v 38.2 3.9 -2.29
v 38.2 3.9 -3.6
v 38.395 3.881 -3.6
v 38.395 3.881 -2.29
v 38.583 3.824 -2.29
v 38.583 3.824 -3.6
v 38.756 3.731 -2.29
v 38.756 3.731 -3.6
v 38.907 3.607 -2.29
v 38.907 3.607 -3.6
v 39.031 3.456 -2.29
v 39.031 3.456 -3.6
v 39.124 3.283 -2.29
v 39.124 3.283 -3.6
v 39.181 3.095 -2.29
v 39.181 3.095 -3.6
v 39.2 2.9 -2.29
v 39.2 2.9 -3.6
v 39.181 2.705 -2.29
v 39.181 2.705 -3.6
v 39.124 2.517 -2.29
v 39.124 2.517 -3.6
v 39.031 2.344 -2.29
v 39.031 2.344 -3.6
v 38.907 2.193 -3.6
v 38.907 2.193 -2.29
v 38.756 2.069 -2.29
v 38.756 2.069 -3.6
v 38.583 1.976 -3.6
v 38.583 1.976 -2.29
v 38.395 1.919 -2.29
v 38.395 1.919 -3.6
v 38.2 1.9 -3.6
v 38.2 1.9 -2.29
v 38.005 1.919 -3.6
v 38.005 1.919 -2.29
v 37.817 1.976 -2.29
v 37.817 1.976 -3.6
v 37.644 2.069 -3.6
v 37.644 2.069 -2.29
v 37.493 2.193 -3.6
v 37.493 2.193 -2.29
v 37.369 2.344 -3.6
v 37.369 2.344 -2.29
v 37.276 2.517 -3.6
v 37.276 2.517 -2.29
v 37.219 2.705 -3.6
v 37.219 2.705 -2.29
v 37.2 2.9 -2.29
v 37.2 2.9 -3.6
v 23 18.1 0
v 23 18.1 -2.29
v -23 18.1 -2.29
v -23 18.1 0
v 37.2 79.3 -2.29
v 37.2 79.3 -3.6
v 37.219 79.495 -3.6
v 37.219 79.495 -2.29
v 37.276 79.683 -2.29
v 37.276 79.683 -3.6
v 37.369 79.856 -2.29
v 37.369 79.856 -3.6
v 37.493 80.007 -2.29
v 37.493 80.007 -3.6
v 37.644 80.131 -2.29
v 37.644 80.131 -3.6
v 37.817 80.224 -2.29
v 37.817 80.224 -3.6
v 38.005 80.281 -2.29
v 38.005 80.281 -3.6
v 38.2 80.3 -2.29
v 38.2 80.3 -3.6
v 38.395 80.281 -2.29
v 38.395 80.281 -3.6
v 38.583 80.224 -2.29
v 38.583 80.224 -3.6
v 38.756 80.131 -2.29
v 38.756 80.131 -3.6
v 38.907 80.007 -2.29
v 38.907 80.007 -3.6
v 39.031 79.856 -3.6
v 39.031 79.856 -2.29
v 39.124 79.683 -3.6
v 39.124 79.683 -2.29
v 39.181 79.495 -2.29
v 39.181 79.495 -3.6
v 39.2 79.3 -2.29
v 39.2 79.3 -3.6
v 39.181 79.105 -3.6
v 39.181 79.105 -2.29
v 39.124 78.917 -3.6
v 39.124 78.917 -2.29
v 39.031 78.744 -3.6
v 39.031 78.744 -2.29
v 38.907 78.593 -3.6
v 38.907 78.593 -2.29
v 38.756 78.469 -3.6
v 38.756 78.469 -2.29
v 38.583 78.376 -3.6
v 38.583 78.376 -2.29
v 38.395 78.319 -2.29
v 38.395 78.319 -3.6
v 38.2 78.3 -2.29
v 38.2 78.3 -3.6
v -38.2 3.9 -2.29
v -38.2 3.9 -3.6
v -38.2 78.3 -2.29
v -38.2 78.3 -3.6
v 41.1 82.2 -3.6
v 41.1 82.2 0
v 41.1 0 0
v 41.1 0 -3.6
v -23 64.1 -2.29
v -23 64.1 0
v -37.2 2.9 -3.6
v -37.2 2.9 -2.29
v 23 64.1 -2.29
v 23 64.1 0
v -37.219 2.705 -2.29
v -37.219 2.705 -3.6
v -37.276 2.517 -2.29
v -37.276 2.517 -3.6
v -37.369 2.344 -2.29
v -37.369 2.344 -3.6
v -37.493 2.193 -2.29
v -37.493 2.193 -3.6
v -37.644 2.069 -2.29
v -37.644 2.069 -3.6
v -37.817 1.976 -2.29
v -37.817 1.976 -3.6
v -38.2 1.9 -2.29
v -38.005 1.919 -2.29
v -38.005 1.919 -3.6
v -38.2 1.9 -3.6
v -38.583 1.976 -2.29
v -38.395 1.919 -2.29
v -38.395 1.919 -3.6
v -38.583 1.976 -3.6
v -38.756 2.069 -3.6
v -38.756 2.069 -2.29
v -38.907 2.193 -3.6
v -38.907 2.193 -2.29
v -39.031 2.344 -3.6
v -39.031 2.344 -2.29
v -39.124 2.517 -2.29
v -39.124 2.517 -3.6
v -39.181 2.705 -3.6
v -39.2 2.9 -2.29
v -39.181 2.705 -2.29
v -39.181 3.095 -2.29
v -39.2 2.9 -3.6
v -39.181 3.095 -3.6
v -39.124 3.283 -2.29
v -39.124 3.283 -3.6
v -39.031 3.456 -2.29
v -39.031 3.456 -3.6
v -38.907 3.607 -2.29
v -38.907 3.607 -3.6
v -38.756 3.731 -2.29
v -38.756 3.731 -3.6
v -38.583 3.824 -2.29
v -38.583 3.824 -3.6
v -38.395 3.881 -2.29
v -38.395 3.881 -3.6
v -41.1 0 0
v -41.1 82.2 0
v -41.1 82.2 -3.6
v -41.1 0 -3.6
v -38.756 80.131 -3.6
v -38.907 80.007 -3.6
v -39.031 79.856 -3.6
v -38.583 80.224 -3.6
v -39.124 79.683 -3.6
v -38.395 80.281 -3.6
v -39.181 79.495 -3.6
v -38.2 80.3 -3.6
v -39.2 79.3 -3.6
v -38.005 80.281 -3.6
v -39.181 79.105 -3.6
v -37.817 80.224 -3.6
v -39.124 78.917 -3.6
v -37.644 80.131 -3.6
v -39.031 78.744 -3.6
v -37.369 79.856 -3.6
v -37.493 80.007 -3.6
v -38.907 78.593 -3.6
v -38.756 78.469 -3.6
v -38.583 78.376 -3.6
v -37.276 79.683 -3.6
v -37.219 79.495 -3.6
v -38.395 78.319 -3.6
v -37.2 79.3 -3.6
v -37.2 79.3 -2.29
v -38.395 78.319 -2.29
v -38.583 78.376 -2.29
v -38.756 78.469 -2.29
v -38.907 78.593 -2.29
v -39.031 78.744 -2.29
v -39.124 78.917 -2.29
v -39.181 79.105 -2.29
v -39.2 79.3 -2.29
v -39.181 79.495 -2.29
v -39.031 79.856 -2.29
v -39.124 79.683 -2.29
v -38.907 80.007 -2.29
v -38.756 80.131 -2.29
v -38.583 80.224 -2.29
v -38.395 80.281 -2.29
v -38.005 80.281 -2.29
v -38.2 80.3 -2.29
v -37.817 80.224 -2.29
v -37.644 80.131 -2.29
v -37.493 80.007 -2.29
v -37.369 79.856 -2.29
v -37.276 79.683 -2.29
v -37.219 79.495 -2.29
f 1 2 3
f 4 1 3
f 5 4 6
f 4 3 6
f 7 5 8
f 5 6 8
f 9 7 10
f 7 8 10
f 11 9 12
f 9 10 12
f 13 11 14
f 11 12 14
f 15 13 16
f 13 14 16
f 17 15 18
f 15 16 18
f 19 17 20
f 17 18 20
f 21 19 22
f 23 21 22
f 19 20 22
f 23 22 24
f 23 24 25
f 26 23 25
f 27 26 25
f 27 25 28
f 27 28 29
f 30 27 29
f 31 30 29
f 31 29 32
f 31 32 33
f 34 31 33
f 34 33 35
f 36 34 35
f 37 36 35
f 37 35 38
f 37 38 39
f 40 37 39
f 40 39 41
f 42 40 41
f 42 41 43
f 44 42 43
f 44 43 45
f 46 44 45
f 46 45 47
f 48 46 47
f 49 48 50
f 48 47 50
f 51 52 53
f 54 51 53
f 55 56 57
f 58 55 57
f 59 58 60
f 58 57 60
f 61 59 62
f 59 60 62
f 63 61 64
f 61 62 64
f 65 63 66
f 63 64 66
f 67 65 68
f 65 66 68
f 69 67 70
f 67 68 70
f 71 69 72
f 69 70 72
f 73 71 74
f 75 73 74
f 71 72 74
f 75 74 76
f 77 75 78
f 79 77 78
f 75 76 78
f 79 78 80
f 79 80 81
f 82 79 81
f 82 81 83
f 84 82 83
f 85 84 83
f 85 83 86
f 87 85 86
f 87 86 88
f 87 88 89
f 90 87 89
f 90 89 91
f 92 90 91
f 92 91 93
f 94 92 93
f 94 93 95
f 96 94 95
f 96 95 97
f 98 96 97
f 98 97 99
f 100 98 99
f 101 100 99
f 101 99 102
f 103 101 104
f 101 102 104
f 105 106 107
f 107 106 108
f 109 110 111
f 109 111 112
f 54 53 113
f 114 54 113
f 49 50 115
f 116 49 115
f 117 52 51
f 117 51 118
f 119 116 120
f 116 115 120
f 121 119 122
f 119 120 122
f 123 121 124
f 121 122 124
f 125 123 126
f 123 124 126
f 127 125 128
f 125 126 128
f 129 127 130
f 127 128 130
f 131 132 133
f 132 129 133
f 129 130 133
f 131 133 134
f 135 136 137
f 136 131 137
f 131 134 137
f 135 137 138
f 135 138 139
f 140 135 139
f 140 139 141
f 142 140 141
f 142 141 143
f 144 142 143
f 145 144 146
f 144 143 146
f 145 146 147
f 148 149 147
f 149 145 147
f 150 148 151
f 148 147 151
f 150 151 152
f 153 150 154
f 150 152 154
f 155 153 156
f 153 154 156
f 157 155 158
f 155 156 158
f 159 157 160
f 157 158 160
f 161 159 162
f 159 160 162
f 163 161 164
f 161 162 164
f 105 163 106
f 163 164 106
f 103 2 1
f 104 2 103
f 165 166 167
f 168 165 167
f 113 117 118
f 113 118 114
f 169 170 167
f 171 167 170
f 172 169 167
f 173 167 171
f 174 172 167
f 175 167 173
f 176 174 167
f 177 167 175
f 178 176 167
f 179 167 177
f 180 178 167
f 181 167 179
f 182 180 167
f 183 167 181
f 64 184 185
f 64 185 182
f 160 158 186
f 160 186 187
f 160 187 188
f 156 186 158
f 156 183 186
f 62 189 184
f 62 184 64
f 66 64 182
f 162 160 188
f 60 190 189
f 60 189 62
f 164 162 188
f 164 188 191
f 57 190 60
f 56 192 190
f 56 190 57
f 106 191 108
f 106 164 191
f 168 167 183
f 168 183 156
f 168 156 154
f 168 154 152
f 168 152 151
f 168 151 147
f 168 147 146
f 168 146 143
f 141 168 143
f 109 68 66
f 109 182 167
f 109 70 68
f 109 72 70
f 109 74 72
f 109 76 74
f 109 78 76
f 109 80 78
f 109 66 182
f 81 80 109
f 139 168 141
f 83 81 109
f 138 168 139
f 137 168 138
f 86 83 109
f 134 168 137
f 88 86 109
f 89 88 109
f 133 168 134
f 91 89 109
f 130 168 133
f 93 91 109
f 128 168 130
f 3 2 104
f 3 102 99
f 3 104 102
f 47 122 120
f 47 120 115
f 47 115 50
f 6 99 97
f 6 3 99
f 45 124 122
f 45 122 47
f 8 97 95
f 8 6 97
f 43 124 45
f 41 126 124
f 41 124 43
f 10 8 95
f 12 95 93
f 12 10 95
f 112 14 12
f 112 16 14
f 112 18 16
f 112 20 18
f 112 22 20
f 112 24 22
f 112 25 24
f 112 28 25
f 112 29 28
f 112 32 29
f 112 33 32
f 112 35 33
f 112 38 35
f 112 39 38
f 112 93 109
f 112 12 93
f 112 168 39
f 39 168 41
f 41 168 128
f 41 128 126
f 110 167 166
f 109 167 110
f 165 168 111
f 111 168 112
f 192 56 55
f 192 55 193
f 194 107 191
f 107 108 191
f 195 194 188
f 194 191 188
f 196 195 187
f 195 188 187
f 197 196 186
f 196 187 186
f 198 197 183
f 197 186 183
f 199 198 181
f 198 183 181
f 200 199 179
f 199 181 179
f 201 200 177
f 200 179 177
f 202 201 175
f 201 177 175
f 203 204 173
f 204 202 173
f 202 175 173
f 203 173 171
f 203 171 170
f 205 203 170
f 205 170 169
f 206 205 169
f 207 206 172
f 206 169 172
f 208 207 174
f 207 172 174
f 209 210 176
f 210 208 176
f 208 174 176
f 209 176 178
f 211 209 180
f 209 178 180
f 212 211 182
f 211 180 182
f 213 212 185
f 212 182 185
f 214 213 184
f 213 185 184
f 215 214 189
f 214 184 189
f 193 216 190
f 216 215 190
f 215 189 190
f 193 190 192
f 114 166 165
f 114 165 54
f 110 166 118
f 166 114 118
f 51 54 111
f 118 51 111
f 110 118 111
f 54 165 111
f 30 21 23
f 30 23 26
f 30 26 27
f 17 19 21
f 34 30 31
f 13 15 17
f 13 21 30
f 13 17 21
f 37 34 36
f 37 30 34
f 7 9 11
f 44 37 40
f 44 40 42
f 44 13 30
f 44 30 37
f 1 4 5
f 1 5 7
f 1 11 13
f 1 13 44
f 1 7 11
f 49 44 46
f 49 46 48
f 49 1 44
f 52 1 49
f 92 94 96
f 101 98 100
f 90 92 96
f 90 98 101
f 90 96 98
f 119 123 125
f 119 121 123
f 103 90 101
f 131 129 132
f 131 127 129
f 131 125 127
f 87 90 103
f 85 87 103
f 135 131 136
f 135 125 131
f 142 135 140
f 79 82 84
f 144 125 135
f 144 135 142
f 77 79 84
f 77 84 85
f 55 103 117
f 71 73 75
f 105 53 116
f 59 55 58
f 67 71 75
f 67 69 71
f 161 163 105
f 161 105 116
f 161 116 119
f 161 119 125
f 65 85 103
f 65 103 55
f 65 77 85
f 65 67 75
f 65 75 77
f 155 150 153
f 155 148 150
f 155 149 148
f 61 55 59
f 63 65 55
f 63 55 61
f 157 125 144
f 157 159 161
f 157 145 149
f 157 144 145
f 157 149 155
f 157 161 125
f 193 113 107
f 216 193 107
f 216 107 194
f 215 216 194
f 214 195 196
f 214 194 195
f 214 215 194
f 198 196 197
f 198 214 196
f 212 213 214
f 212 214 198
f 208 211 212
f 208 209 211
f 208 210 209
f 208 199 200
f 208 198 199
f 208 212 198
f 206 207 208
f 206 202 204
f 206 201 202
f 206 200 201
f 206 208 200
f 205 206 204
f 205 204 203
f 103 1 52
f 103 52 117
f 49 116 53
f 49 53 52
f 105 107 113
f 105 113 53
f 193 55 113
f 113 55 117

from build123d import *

# Parameters (mm, degrees)
SKETCH1_W           = 82.2
SKETCH1_H           = 3.6
BOSS_EXTRUDE1_DEPTH = 82.2
SKETCH2_W           = 76.4
SKETCH2_H           = 76.4
CUT_EXTRUDE1_DEPTH  = 1.31
SKETCH4_R           = 1
CUT_EXTRUDE3_DEPTH  = 1.31
SKETCH3_W           = 46
SKETCH3_H           = 46
CUT_EXTRUDE2_DEPTH  = 92.930920261


with BuildPart() as part:
    # Sketch1 → Boss-Extrude1 (new body)
    with BuildSketch(Plane(origin=(0, 0, 0), x_dir=(1, 0, 0), z_dir=(0, 1, 0))):
        with Locations((0, 1.8)):
            Rectangle(SKETCH1_W, SKETCH1_H)
    extrude(amount=BOSS_EXTRUDE1_DEPTH)

    # Sketch2 → Cut-Extrude1 (cut)
    with BuildSketch(Plane(origin=(0, 0, -3.6), x_dir=(-1, 0, 0), z_dir=(0, 0, -1))):
        with Locations((0, 41.1)):
            Rectangle(SKETCH2_W, SKETCH2_H)
    extrude(amount=-CUT_EXTRUDE1_DEPTH, mode=Mode.SUBTRACT)

    # Sketch4 → Cut-Extrude3 (cut)
    with BuildSketch(Plane(origin=(0, 0, -3.6), x_dir=(-1, 0, 0), z_dir=(0, 0, -1))):
        with Locations((38.2, 2.9)):
            Circle(SKETCH4_R)
        with Locations((38.2, 79.3)):
            Circle(SKETCH4_R)
        with Locations((-38.2, 2.9)):
            Circle(SKETCH4_R)
        with Locations((-38.2, 79.3)):
            Circle(SKETCH4_R)
    extrude(amount=-CUT_EXTRUDE3_DEPTH, mode=Mode.SUBTRACT)

    # Sketch3 → Cut-Extrude2 (cut, through all)
    with BuildSketch(Plane(origin=(0, 0, -2.29), x_dir=(-1, 0, 0), z_dir=(0, 0, -1))):
        with Locations((0, 41.1)):
            Rectangle(SKETCH3_W, SKETCH3_H)
    extrude(amount=-CUT_EXTRUDE2_DEPTH, mode=Mode.SUBTRACT)


solid = part.part
